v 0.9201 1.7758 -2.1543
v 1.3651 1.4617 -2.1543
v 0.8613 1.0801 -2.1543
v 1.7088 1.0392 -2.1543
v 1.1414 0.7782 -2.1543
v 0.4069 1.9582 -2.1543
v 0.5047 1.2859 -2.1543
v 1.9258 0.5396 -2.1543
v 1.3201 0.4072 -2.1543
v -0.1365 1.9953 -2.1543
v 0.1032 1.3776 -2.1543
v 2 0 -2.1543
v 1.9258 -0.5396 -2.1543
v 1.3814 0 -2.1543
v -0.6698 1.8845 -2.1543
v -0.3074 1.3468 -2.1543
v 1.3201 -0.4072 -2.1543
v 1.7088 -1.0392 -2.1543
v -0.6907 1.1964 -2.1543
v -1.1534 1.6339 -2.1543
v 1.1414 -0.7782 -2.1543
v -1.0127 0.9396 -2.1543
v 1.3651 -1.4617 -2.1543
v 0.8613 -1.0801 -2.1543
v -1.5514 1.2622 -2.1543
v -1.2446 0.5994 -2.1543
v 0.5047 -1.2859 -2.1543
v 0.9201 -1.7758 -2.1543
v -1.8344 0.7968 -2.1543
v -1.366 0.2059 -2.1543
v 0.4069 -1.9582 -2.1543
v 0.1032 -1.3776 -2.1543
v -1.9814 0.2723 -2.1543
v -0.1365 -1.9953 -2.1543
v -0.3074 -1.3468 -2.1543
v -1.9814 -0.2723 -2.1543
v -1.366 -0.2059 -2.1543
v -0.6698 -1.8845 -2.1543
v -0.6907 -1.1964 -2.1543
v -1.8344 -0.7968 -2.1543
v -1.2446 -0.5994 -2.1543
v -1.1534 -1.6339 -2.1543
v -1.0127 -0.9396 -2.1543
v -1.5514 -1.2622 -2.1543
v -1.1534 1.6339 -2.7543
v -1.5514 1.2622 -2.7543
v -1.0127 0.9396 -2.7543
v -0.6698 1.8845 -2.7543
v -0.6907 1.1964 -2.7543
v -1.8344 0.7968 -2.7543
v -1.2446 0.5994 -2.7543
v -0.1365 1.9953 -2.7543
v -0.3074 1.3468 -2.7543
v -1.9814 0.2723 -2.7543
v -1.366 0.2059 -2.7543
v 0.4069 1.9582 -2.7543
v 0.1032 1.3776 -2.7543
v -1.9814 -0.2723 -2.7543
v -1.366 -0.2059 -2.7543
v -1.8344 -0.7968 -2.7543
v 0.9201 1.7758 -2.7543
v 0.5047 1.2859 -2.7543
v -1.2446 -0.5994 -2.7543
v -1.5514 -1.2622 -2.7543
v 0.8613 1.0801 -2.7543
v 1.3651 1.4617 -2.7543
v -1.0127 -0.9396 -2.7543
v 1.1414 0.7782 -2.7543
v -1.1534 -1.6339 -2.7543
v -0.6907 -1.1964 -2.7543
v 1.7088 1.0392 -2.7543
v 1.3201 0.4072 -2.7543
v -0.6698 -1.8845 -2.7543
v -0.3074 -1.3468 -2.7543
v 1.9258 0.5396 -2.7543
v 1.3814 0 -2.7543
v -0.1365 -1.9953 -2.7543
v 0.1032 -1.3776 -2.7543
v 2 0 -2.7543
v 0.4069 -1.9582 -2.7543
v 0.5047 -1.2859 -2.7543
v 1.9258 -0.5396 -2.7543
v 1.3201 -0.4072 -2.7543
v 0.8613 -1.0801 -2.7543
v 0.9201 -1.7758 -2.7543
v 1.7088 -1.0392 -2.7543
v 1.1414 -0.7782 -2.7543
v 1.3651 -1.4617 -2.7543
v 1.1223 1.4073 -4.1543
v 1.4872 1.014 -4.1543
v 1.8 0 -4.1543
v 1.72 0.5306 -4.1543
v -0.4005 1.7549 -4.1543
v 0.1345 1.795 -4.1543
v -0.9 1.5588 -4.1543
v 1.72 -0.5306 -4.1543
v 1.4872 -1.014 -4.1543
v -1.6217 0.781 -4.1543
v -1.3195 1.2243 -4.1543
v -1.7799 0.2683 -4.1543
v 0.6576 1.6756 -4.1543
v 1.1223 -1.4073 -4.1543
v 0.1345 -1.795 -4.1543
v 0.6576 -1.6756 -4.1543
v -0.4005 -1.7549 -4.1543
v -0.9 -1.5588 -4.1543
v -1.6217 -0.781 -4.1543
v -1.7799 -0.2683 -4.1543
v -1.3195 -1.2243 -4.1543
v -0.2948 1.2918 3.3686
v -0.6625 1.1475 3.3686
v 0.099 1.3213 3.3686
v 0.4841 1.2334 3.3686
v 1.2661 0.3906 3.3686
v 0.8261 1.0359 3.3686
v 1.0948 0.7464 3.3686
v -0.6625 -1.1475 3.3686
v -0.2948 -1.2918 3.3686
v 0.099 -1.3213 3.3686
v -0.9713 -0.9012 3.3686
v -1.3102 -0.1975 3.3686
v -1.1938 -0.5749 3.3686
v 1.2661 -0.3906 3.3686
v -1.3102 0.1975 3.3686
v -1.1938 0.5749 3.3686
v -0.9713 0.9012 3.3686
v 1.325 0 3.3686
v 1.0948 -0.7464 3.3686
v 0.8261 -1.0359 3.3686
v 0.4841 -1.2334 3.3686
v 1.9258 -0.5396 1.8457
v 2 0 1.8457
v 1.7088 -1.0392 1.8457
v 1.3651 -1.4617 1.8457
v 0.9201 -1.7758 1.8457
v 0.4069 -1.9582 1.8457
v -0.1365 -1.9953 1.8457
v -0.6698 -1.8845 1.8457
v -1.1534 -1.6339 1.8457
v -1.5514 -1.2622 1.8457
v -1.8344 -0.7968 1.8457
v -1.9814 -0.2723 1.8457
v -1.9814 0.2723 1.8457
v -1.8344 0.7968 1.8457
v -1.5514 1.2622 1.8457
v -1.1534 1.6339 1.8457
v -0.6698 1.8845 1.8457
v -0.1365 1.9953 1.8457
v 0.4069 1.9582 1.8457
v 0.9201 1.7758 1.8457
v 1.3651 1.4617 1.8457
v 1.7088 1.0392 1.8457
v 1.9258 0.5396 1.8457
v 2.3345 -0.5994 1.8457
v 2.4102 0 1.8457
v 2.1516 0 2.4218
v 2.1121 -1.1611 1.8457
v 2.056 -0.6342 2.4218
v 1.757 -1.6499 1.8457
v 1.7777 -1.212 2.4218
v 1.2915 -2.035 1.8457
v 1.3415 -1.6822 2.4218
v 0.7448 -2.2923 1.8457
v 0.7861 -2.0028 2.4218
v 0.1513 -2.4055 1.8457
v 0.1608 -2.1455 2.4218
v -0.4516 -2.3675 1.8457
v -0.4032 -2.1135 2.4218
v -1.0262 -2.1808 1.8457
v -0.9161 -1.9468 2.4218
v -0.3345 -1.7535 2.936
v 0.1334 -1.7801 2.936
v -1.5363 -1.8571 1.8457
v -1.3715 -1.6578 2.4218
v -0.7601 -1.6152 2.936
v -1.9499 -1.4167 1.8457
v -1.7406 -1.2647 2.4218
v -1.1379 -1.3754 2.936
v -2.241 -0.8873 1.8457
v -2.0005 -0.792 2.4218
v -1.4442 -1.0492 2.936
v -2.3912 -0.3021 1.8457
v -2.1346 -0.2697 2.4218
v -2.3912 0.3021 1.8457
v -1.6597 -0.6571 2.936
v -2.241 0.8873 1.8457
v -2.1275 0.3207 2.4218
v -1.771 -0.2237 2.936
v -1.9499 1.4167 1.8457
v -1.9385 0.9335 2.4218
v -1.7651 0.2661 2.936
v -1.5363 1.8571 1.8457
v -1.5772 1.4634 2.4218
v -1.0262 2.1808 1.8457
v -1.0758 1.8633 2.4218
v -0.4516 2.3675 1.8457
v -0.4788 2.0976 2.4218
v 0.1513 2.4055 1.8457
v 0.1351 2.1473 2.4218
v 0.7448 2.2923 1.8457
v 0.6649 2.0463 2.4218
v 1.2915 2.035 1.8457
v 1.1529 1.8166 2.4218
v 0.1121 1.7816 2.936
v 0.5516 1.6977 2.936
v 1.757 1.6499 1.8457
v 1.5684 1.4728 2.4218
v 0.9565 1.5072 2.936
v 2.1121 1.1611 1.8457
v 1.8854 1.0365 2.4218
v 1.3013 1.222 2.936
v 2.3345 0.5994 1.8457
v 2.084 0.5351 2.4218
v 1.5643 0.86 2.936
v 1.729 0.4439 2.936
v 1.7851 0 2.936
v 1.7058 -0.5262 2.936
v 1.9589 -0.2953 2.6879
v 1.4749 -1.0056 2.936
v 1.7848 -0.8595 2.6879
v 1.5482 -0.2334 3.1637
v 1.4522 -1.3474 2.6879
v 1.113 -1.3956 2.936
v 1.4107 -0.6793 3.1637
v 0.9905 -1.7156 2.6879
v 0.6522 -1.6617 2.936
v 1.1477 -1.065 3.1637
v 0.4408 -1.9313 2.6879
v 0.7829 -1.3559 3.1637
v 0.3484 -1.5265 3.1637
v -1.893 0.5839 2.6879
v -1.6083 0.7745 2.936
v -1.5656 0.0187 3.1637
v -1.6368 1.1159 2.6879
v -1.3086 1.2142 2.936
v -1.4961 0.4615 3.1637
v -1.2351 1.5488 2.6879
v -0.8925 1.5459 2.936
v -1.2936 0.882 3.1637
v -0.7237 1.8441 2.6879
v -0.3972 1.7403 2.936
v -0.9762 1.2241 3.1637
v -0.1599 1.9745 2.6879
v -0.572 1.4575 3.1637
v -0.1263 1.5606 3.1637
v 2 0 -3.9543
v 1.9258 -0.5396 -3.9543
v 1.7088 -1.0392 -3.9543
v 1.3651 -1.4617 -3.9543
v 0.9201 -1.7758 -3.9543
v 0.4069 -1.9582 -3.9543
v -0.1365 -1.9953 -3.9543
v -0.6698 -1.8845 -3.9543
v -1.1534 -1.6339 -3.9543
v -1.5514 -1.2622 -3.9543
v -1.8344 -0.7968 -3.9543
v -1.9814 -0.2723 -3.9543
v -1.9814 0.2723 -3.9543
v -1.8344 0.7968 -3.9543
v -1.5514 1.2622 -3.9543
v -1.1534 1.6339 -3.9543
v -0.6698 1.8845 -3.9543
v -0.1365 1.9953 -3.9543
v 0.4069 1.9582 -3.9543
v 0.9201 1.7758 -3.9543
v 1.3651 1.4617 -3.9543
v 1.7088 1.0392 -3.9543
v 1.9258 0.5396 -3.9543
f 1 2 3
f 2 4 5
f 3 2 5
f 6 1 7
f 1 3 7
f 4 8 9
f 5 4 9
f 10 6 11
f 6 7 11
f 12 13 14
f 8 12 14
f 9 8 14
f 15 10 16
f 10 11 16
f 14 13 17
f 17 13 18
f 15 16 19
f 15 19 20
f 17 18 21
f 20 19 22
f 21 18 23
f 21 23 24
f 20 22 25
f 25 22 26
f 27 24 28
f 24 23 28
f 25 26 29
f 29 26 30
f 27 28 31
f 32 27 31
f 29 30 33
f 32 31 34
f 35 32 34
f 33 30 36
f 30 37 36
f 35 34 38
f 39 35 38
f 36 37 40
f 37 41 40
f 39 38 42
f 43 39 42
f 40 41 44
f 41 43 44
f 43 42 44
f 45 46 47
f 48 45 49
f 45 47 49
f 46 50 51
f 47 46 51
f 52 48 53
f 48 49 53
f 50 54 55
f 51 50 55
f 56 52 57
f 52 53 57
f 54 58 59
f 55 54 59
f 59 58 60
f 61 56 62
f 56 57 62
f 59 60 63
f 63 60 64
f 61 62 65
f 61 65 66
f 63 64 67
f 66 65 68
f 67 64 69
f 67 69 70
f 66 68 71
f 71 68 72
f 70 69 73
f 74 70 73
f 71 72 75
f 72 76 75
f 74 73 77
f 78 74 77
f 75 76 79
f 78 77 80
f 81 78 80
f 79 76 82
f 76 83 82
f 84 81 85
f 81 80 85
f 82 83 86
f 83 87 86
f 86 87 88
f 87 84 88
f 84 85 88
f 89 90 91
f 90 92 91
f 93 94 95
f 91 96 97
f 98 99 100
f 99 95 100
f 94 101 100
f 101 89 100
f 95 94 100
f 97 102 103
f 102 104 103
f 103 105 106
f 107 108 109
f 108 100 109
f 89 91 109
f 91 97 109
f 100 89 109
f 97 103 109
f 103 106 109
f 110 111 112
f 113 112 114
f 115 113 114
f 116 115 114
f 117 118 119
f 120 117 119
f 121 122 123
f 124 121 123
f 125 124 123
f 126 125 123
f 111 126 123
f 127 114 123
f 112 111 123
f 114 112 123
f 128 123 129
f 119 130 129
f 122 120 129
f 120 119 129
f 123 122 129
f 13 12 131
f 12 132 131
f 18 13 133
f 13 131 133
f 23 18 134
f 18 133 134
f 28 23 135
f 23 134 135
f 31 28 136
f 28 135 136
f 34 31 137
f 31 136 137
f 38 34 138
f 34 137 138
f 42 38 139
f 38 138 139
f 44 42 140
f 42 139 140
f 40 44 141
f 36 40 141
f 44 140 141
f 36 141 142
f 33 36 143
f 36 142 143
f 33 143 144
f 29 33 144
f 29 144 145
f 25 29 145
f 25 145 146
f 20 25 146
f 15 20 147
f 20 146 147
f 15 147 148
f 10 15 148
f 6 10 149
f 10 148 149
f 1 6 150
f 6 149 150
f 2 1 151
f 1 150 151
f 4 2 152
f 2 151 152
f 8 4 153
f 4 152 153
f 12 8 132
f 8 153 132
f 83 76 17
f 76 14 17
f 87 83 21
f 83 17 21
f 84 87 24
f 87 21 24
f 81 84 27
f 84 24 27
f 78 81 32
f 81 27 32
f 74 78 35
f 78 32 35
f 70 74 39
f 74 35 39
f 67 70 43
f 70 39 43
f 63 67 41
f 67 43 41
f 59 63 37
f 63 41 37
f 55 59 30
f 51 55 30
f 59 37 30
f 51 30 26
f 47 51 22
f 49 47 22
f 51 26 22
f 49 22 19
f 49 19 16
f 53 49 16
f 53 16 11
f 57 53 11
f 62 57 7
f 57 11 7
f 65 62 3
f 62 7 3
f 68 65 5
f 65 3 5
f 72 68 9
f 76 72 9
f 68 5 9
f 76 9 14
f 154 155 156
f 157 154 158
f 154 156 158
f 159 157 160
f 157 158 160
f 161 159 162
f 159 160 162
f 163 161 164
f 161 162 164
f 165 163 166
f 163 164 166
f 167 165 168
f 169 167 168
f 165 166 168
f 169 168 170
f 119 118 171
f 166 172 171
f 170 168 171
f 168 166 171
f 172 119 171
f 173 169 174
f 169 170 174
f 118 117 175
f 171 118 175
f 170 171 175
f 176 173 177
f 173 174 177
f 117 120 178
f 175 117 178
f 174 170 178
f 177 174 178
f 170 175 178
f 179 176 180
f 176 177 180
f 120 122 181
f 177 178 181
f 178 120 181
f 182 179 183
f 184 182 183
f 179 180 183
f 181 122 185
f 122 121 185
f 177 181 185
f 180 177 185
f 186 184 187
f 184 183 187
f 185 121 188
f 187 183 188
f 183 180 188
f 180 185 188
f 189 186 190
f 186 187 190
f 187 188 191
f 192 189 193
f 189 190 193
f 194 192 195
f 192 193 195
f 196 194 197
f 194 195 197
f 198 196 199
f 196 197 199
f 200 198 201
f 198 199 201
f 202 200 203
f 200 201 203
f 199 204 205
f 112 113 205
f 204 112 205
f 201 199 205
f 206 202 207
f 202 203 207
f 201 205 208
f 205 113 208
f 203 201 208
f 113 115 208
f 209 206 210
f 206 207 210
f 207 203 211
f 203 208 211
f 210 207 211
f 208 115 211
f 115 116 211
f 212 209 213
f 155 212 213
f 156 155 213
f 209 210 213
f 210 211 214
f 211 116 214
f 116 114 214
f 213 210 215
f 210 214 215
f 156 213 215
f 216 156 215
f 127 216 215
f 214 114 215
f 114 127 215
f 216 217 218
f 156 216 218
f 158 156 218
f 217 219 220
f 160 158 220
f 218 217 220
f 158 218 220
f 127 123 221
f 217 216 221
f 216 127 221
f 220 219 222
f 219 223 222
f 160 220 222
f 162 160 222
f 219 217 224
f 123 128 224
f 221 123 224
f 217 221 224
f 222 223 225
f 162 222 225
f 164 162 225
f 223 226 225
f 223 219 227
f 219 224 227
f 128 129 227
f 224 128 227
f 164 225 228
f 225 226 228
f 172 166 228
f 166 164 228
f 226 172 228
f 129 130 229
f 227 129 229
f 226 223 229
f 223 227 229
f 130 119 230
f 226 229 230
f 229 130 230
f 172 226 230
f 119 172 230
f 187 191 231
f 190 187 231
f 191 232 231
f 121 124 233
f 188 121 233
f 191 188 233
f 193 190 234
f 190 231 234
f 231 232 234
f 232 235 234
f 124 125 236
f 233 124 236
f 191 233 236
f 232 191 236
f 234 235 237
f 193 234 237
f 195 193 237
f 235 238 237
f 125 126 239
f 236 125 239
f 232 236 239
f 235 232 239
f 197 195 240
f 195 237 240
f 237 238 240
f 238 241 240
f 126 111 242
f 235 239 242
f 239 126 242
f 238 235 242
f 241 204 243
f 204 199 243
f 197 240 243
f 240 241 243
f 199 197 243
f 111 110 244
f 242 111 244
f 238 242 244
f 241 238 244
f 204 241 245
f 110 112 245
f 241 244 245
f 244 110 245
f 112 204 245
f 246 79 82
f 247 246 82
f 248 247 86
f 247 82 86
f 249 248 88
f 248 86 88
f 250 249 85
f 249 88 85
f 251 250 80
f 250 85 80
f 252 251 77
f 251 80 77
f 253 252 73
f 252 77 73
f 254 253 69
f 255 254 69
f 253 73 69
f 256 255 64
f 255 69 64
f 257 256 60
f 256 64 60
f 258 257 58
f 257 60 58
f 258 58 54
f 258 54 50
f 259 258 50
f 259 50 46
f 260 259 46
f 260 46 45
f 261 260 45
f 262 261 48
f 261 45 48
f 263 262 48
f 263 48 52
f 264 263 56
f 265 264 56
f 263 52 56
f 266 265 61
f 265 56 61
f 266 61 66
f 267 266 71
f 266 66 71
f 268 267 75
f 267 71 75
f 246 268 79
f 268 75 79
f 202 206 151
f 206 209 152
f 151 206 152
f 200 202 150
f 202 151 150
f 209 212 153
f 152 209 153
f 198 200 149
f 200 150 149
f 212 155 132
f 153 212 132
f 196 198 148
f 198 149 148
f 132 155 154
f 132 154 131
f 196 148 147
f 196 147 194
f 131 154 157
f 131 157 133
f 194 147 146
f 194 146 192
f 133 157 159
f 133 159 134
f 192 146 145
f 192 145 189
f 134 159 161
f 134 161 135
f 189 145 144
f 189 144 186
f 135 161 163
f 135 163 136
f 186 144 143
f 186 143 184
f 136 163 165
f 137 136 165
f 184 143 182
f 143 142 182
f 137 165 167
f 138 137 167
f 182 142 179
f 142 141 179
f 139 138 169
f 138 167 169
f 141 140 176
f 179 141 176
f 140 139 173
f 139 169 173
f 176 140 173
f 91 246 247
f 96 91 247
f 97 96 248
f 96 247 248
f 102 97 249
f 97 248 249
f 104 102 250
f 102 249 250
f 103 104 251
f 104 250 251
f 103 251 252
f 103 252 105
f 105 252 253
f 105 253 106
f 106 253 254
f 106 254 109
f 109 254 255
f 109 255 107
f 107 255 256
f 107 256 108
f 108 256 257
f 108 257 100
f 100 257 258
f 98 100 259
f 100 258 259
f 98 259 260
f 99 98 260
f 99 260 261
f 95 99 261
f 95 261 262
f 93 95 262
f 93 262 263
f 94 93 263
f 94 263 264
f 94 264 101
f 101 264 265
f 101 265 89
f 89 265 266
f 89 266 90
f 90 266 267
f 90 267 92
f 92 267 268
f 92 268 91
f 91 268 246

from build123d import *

# Parameters (mm, degrees)
CHAMFER1_SIZE = 0.2


with BuildPart() as part:
    # Sketch1 → Revolve1 (revolve)
    with BuildSketch(Plane(origin=(0, 0, 0), x_dir=(0, 0, -1), z_dir=(1, 0, 0)), mode=Mode.PRIVATE) as revolve1_sk:
        with BuildLine():
            Line((-1.80638465, 0), (2.358456395, 0))
            Line((2.358456395, 0), (4.154321235, 0))
            Line((4.154321235, 0), (4.154321235, 2))
            Line((4.154321235, 2), (2.754321235, 2))
            Line((2.754321235, 2), (2.754321235, 1.381443299))
            Line((2.754321235, 1.381443299), (2.154321235, 1.381443299))
            Line((2.154321235, 1.381443299), (2.154321235, 2))
            Line((2.154321235, 2), (-1.845678765, 2))
            Line((-1.845678765, 2), (-1.845678765, 2.410234036))
            ThreePointArc((-1.845678765, 2.410234036), (-2.687941743, 1.981004397), (-3.368605566, 1.325))
            Line((-3.368605566, 1.325), (-3.368605566, 0))
            Line((-3.368605566, 0), (-1.80638465, 0))
        make_face()
    revolve(revolve1_sk.sketch.rotate(Axis((0, 0, 1.80638465), (0, 0, -1)), 90), axis=Axis((0, 0, 1.80638465), (0, 0, -1)))

    # Chamfer1
    chamfer1_edges = [part.edges().sort_by_distance(p)[0] for p in [
        (-2, 0, -4.154321235),
    ]]
    chamfer(chamfer1_edges, length=CHAMFER1_SIZE)


solid = part.part
